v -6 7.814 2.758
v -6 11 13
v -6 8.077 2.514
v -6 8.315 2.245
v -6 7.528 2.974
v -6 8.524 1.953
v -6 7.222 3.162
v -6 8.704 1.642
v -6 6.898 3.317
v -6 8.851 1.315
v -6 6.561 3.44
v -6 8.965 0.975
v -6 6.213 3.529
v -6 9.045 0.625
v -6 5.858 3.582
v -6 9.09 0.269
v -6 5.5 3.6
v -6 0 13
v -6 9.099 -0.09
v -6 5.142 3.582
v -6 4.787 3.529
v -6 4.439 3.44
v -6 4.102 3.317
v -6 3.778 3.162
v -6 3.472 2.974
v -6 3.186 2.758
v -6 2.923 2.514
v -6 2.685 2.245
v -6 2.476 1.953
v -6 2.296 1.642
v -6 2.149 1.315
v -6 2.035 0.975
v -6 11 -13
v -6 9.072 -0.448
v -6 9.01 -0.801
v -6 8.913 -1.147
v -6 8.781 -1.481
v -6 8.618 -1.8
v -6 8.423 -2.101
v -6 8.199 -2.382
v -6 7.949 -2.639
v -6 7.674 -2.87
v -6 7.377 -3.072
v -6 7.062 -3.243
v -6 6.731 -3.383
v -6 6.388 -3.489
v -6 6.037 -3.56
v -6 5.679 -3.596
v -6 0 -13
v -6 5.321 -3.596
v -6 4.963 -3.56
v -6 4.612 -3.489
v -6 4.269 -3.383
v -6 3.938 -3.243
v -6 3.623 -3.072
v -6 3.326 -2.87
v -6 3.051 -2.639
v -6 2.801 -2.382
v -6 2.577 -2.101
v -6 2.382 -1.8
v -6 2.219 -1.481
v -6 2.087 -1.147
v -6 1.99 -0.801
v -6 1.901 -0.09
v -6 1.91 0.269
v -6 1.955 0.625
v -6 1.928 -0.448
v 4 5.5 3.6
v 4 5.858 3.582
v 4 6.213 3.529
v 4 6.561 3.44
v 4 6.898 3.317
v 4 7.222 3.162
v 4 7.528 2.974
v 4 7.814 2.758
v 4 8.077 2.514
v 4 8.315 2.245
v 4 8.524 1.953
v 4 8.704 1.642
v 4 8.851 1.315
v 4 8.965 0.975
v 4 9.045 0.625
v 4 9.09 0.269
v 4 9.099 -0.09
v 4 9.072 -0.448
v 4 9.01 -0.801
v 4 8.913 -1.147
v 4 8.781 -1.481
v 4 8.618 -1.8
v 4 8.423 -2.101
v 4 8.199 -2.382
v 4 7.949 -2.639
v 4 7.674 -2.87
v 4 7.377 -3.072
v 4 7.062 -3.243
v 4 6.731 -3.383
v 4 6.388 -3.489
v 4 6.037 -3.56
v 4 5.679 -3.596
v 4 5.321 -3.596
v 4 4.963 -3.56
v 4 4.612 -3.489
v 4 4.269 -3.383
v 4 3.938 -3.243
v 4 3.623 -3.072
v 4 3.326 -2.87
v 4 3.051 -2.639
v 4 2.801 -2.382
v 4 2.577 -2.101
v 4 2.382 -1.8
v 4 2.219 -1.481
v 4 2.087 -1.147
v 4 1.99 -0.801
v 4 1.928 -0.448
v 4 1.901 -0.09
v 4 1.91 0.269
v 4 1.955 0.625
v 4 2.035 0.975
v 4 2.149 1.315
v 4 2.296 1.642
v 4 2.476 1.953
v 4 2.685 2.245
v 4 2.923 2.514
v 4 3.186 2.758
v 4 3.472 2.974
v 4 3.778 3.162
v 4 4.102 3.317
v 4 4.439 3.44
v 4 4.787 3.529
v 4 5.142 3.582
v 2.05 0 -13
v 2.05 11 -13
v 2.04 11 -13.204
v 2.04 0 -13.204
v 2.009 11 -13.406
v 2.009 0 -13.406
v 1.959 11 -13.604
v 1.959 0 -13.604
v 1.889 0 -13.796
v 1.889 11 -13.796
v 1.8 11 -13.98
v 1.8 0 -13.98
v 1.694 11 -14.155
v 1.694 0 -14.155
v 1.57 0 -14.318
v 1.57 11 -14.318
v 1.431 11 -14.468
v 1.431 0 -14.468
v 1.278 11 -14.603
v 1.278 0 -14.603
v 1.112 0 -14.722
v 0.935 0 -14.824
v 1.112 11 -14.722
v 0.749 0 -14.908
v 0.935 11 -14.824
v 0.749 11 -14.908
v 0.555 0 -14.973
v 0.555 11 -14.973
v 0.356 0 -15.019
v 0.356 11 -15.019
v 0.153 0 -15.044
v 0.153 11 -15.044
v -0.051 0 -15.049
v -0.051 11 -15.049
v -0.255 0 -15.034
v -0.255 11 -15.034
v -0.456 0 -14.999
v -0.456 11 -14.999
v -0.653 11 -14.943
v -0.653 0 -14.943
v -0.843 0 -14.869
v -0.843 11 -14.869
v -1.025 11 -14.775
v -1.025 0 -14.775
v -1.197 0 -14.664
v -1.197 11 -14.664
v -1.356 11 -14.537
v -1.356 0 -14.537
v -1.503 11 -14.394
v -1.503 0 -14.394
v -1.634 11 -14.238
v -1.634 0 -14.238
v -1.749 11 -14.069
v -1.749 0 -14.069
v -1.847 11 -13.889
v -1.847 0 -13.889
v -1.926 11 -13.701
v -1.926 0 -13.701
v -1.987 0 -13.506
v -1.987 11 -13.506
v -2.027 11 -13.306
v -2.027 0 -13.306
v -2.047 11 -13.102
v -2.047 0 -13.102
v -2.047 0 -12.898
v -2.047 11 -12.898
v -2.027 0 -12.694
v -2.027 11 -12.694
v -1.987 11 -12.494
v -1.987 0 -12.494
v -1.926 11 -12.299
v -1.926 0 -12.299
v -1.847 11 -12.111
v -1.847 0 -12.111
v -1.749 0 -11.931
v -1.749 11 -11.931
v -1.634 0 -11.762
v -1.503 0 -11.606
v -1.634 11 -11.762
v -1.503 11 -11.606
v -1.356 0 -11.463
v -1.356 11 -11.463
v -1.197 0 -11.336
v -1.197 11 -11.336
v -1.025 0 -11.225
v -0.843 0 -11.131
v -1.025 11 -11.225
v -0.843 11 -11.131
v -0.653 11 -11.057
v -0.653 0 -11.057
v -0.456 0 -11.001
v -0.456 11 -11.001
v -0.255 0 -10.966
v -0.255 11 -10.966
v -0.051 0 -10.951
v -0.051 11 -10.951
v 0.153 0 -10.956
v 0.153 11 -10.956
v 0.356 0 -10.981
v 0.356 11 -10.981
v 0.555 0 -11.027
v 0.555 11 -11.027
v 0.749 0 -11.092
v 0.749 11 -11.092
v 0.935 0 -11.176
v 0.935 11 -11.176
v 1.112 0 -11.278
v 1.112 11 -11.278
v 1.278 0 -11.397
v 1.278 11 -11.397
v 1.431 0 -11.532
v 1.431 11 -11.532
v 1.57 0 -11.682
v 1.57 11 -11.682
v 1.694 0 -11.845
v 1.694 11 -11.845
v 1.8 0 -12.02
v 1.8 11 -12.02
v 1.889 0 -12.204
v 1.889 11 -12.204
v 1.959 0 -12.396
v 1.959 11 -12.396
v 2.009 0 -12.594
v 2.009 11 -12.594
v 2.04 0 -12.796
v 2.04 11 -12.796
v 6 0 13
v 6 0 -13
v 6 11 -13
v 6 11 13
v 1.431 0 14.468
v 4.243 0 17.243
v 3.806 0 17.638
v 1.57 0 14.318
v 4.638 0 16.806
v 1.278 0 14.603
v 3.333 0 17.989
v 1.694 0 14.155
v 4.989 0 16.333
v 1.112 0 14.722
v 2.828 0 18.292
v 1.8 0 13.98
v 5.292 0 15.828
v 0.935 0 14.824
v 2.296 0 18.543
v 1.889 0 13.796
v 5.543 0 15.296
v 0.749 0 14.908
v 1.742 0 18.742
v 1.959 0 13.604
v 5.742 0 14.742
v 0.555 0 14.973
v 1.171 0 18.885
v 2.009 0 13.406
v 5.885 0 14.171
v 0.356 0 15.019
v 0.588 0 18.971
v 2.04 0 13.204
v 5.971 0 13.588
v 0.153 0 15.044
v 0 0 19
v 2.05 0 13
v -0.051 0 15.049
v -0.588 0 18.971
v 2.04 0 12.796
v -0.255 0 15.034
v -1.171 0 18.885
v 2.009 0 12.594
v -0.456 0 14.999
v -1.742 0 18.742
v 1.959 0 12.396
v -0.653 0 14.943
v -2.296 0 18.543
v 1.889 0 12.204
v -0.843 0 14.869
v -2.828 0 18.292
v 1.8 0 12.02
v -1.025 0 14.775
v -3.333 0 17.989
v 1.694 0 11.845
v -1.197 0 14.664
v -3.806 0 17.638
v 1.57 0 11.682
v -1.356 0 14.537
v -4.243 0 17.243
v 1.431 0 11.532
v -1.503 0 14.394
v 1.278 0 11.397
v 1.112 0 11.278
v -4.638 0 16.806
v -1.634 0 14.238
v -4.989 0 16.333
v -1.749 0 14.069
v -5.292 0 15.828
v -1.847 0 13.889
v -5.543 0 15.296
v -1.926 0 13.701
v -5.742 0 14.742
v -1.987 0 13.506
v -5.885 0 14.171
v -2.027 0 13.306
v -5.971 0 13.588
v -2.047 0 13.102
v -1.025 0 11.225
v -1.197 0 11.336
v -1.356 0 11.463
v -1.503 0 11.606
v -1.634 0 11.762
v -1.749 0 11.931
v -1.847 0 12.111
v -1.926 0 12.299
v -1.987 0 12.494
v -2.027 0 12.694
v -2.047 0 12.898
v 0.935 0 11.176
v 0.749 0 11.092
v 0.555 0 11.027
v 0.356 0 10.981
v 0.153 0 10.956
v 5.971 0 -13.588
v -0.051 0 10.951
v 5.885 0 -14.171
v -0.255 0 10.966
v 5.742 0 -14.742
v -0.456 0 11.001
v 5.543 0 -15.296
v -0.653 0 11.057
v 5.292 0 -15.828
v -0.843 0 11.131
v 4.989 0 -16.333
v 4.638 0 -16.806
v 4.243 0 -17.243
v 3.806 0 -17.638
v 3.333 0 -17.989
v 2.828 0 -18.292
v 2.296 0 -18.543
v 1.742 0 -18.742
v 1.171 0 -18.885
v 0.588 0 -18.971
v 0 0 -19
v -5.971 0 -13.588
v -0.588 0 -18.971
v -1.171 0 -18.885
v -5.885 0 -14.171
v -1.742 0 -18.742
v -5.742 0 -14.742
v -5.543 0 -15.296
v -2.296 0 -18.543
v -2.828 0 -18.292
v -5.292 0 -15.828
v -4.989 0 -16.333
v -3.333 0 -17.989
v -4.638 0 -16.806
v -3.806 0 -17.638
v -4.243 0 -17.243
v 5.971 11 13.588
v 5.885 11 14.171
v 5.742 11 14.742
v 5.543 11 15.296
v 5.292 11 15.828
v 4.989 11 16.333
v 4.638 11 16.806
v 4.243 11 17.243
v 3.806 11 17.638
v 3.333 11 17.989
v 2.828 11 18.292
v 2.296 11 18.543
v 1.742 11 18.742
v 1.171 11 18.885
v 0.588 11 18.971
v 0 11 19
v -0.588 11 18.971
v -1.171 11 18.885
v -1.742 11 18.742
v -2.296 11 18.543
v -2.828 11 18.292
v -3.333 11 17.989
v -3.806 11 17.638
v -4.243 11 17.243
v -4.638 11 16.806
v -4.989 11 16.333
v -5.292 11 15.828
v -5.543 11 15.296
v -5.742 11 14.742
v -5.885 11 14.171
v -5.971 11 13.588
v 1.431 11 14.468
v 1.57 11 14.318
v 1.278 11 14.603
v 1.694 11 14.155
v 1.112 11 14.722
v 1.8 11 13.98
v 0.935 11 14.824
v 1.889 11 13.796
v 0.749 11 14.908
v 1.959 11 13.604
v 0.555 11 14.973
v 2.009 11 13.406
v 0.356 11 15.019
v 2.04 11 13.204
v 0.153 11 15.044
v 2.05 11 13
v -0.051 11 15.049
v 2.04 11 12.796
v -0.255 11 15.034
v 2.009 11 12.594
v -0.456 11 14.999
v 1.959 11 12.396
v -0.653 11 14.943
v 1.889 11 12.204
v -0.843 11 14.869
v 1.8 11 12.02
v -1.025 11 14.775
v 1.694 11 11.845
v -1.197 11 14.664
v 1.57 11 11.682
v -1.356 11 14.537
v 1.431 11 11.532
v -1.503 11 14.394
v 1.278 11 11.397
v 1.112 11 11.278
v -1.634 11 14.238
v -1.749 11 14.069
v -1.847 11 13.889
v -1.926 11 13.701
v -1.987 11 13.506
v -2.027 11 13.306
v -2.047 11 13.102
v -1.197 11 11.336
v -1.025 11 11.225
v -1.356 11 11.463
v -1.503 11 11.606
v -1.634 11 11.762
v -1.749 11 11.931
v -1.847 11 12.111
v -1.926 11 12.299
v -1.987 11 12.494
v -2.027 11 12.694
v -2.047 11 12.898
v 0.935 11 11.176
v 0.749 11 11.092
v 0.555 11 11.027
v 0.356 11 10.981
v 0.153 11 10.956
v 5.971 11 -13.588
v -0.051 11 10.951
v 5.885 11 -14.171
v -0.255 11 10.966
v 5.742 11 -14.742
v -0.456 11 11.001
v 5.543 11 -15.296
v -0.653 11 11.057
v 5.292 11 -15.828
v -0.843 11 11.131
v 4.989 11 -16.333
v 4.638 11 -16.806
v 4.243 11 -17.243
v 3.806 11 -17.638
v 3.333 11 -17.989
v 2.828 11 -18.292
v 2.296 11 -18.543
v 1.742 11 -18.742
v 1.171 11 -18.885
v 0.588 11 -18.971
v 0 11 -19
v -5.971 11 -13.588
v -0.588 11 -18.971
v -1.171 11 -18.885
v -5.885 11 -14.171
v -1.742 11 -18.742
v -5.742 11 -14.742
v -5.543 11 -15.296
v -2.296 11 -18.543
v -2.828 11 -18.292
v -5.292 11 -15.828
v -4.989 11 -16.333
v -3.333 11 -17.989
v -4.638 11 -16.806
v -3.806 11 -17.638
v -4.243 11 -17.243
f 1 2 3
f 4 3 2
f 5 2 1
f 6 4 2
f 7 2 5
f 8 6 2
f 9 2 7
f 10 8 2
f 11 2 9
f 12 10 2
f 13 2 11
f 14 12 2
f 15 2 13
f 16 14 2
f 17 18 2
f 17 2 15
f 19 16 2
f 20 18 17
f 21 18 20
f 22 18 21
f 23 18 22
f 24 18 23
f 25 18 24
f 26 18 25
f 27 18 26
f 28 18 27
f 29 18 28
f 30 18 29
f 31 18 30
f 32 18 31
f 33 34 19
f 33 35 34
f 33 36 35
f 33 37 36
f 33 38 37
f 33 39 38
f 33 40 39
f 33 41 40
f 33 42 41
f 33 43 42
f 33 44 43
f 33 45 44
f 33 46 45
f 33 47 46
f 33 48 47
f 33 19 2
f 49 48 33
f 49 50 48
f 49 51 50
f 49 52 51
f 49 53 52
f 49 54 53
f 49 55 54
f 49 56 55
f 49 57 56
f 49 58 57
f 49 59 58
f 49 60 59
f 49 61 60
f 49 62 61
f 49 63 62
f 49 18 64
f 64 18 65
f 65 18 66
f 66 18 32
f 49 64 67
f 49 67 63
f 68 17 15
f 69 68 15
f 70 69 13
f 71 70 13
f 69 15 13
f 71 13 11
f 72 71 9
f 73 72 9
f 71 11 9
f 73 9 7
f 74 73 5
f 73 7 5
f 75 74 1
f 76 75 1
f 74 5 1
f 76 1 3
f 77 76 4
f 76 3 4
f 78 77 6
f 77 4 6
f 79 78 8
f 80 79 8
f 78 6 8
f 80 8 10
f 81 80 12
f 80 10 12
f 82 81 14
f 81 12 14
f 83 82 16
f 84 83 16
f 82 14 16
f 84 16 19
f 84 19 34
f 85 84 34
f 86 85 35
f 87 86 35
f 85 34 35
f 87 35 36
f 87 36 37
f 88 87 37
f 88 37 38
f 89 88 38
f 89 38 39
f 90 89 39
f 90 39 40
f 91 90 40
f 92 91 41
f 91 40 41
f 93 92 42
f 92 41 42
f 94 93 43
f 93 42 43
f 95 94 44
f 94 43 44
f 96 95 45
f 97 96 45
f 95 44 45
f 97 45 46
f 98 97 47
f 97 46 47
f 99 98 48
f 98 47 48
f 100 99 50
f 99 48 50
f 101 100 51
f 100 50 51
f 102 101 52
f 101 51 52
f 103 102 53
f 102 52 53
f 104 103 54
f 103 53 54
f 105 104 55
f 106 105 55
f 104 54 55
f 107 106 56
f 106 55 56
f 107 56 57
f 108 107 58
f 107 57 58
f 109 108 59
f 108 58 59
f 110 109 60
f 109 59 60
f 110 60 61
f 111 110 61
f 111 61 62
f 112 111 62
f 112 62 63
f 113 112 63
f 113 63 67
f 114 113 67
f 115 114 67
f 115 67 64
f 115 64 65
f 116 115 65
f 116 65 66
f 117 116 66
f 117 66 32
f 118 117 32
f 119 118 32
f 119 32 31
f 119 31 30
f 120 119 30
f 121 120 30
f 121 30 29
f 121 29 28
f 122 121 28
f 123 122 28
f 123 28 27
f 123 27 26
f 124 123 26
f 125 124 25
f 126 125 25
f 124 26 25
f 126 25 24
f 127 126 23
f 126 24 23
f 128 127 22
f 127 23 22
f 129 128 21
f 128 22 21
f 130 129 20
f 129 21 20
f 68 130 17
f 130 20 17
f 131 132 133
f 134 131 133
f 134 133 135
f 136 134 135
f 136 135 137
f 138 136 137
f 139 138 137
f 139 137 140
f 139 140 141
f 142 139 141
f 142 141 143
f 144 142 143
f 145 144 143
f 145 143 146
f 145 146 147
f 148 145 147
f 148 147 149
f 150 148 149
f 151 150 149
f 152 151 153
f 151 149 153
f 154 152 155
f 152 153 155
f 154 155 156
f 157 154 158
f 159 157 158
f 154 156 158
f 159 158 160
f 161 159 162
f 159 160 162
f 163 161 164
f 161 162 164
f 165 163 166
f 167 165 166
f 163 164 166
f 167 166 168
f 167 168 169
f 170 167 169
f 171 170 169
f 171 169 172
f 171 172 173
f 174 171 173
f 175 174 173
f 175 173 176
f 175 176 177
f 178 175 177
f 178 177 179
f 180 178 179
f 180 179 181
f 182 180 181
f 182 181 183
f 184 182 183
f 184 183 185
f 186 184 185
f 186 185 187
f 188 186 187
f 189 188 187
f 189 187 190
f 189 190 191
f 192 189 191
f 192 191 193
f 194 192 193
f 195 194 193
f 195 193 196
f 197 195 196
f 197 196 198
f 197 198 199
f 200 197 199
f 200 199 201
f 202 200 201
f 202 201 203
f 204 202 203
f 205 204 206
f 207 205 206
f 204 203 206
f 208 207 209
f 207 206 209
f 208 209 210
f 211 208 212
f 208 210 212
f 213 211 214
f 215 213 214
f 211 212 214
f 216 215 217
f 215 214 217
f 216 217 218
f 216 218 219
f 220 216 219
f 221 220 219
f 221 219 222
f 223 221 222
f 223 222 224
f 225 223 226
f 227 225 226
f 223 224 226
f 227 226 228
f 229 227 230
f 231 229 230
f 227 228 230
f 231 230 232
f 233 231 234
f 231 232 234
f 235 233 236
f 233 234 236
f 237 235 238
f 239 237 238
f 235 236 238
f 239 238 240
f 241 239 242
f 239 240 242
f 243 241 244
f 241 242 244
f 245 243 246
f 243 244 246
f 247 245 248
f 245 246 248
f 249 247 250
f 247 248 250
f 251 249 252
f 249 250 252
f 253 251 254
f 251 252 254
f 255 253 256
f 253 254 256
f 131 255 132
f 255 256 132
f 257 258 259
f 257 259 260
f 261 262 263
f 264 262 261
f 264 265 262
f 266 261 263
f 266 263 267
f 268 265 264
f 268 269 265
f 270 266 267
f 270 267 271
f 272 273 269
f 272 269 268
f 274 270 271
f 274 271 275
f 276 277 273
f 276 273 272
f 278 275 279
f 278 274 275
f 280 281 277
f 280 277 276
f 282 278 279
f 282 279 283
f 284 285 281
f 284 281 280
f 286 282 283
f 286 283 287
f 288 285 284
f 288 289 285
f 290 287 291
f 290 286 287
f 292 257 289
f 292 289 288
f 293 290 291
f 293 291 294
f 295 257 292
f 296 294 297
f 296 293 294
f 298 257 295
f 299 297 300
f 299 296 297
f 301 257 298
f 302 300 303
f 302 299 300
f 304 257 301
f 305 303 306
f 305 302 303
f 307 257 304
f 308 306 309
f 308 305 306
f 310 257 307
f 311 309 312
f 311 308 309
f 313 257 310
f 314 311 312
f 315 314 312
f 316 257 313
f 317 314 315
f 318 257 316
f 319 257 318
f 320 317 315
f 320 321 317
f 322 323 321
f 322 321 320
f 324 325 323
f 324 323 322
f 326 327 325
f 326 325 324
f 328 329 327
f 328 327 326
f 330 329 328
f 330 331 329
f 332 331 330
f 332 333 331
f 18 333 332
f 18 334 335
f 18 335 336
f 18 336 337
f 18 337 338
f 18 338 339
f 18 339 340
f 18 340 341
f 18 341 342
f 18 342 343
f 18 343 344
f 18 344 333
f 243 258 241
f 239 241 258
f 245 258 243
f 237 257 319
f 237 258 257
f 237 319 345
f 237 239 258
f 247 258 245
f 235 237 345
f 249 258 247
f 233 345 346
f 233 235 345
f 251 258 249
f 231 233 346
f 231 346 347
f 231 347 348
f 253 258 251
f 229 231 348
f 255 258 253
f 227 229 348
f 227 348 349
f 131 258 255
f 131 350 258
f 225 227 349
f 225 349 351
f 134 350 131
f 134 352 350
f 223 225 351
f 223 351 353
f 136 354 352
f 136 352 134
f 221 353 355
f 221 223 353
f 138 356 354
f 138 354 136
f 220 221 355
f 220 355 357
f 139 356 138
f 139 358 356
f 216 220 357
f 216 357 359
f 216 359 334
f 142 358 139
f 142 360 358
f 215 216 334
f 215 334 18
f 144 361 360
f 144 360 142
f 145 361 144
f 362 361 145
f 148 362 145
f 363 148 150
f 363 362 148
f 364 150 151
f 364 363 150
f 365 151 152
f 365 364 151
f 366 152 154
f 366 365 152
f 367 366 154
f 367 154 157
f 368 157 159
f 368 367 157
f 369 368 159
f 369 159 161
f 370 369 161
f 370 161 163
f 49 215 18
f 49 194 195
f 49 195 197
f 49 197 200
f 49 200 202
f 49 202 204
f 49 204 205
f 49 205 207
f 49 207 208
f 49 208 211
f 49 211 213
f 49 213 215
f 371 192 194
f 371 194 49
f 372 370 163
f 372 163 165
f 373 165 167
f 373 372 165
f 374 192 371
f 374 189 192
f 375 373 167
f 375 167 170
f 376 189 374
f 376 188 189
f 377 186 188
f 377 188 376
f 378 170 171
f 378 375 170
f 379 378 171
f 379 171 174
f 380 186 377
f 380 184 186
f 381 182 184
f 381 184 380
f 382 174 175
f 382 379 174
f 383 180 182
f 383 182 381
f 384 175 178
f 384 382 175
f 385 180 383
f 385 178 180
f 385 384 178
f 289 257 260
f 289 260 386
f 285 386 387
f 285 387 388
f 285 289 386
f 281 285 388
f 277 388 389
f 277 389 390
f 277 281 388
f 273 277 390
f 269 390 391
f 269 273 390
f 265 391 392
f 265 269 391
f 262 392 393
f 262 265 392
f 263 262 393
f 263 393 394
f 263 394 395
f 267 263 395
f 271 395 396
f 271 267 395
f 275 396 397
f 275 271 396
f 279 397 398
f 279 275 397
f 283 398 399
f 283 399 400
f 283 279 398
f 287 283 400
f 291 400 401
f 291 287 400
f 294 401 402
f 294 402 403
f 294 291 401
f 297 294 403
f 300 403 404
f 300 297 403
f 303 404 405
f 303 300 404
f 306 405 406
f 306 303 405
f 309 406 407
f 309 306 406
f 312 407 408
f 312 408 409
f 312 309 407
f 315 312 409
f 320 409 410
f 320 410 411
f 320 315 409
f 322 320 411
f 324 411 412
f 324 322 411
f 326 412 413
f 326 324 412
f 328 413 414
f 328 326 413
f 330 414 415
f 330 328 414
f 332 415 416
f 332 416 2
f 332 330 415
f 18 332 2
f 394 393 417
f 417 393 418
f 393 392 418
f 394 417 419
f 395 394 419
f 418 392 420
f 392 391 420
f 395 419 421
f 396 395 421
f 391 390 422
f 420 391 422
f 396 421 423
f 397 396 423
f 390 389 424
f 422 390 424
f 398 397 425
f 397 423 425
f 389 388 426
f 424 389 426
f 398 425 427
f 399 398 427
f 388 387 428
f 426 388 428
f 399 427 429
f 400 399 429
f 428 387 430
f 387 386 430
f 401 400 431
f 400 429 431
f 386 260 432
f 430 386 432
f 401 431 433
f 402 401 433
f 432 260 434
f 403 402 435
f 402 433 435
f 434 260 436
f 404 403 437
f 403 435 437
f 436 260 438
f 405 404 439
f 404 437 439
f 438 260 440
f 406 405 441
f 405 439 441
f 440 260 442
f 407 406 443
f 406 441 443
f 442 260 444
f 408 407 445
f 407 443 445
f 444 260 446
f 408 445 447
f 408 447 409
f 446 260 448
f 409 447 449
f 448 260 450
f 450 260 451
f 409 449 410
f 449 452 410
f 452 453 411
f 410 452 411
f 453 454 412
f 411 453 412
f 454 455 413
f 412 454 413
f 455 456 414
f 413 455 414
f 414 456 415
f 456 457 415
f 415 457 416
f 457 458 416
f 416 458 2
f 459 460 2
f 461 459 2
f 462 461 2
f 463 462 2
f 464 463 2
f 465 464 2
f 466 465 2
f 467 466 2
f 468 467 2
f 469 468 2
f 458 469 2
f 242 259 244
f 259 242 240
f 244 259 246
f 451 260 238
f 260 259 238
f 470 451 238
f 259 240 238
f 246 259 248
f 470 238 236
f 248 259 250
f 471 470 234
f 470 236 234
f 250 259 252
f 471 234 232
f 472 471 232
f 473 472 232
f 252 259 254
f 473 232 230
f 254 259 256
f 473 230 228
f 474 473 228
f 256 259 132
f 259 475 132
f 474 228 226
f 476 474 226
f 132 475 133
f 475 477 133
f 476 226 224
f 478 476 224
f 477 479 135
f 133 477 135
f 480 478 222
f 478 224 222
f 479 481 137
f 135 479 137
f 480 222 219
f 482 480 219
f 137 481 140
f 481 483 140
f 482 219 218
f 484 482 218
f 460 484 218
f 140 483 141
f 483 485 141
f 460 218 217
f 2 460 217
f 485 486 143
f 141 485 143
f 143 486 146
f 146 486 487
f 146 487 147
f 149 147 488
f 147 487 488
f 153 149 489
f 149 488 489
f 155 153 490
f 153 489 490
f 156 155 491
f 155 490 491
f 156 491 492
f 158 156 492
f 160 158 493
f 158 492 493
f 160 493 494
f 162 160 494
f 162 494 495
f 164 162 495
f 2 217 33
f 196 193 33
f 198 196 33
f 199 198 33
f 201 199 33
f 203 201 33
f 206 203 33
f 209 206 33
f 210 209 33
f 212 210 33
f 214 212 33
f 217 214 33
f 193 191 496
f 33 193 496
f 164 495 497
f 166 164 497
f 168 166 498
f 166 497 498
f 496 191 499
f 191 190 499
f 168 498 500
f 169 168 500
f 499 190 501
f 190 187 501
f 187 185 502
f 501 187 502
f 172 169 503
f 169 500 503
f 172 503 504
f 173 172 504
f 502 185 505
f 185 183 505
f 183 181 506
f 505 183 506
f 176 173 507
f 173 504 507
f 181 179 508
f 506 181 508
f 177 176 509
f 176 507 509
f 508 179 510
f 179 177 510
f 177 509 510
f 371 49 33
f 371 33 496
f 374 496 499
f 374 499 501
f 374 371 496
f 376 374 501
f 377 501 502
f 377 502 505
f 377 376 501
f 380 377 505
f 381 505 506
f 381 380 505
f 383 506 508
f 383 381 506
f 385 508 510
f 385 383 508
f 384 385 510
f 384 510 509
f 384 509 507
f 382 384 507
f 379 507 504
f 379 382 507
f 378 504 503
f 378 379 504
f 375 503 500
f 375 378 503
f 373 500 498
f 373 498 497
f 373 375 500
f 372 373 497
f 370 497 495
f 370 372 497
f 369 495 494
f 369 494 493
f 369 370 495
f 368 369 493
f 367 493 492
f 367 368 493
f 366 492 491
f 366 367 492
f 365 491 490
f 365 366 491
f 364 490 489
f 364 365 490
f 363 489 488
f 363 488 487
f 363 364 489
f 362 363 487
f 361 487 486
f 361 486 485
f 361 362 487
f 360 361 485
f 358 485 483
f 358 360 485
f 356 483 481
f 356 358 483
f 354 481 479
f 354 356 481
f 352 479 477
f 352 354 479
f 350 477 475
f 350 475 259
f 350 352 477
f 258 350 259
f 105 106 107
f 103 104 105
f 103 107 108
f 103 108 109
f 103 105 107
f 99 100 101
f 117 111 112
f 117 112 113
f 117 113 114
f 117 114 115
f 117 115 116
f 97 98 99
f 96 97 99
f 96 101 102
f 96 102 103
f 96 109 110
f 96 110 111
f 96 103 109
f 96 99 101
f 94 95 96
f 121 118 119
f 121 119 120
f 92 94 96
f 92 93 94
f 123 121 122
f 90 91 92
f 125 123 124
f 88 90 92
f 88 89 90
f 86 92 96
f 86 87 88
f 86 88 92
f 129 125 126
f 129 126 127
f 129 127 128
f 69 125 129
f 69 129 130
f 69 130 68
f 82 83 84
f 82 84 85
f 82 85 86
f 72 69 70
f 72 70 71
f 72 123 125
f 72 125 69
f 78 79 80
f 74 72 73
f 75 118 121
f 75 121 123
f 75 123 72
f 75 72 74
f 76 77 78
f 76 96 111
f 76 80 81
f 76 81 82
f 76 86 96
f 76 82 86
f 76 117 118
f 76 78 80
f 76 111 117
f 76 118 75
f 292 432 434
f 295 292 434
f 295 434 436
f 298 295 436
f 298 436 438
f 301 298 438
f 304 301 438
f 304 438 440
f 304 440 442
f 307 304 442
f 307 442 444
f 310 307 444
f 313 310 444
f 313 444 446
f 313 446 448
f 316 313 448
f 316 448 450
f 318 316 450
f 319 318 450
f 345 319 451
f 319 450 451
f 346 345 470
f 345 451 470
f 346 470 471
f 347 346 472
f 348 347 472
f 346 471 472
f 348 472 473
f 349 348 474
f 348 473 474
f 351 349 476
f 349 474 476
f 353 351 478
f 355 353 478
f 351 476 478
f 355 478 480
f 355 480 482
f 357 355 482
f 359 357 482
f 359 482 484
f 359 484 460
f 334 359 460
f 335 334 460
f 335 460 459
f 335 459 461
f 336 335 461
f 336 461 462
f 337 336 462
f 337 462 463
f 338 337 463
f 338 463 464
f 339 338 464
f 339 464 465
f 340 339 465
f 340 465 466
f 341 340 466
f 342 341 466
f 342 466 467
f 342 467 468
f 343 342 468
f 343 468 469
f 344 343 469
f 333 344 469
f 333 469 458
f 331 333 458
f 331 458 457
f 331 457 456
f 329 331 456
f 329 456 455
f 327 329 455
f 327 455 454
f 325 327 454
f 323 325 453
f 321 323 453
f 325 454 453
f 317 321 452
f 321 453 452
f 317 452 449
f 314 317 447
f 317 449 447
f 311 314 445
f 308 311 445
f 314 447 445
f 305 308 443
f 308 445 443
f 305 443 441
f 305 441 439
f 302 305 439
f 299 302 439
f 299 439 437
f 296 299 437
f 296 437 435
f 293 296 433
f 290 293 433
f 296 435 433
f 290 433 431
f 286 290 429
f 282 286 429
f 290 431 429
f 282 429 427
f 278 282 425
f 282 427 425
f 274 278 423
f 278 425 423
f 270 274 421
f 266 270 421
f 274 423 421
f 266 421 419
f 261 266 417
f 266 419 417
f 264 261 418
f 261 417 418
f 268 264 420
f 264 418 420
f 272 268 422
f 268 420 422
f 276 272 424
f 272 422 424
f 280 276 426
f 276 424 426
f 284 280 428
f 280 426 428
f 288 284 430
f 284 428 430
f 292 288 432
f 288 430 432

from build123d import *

# Parameters (mm, degrees)
EXTRUDE_1_DEPTH     = 11
SKETCH_2_R          = 2.05
CUT_EXTRUDE_1_DEPTH = 12
SKETCH_3_R          = 3.6
CUT_EXTRUDE_2_DEPTH = 10


with BuildPart() as part:
    # 草图1 → 凸台-拉伸1 (new body)
    with BuildSketch(Plane(origin=(0, 0, 0), x_dir=(1, 0, 0), z_dir=(0, 1, 0))):
        with BuildLine():
            Line((-6, -13), (-6, 13))
            ThreePointArc((-6, 13), (0, 19), (6, 13))
            Line((6, 13), (6, -13))
            ThreePointArc((6, -13), (0, -19), (-6, -13))
        make_face()
    extrude(amount=EXTRUDE_1_DEPTH)

    # 草图2 → 切除-拉伸1 (cut, through all)
    with BuildSketch(Plane(origin=(0, 11, 0), x_dir=(1, 0, 0), z_dir=(0, 1, 0))):
        with Locations((0, 13)):
            Circle(SKETCH_2_R)
        with Locations((0, -13)):
            Circle(SKETCH_2_R)
    extrude(amount=-CUT_EXTRUDE_1_DEPTH, mode=Mode.SUBTRACT)

    # 草图3 → 切除-拉伸2 (cut)
    with BuildSketch(Plane.ZY.offset(6)):
        with Locations((0, 5.5)):
            Circle(SKETCH_3_R)
    extrude(amount=-CUT_EXTRUDE_2_DEPTH, mode=Mode.SUBTRACT)


solid = part.part
